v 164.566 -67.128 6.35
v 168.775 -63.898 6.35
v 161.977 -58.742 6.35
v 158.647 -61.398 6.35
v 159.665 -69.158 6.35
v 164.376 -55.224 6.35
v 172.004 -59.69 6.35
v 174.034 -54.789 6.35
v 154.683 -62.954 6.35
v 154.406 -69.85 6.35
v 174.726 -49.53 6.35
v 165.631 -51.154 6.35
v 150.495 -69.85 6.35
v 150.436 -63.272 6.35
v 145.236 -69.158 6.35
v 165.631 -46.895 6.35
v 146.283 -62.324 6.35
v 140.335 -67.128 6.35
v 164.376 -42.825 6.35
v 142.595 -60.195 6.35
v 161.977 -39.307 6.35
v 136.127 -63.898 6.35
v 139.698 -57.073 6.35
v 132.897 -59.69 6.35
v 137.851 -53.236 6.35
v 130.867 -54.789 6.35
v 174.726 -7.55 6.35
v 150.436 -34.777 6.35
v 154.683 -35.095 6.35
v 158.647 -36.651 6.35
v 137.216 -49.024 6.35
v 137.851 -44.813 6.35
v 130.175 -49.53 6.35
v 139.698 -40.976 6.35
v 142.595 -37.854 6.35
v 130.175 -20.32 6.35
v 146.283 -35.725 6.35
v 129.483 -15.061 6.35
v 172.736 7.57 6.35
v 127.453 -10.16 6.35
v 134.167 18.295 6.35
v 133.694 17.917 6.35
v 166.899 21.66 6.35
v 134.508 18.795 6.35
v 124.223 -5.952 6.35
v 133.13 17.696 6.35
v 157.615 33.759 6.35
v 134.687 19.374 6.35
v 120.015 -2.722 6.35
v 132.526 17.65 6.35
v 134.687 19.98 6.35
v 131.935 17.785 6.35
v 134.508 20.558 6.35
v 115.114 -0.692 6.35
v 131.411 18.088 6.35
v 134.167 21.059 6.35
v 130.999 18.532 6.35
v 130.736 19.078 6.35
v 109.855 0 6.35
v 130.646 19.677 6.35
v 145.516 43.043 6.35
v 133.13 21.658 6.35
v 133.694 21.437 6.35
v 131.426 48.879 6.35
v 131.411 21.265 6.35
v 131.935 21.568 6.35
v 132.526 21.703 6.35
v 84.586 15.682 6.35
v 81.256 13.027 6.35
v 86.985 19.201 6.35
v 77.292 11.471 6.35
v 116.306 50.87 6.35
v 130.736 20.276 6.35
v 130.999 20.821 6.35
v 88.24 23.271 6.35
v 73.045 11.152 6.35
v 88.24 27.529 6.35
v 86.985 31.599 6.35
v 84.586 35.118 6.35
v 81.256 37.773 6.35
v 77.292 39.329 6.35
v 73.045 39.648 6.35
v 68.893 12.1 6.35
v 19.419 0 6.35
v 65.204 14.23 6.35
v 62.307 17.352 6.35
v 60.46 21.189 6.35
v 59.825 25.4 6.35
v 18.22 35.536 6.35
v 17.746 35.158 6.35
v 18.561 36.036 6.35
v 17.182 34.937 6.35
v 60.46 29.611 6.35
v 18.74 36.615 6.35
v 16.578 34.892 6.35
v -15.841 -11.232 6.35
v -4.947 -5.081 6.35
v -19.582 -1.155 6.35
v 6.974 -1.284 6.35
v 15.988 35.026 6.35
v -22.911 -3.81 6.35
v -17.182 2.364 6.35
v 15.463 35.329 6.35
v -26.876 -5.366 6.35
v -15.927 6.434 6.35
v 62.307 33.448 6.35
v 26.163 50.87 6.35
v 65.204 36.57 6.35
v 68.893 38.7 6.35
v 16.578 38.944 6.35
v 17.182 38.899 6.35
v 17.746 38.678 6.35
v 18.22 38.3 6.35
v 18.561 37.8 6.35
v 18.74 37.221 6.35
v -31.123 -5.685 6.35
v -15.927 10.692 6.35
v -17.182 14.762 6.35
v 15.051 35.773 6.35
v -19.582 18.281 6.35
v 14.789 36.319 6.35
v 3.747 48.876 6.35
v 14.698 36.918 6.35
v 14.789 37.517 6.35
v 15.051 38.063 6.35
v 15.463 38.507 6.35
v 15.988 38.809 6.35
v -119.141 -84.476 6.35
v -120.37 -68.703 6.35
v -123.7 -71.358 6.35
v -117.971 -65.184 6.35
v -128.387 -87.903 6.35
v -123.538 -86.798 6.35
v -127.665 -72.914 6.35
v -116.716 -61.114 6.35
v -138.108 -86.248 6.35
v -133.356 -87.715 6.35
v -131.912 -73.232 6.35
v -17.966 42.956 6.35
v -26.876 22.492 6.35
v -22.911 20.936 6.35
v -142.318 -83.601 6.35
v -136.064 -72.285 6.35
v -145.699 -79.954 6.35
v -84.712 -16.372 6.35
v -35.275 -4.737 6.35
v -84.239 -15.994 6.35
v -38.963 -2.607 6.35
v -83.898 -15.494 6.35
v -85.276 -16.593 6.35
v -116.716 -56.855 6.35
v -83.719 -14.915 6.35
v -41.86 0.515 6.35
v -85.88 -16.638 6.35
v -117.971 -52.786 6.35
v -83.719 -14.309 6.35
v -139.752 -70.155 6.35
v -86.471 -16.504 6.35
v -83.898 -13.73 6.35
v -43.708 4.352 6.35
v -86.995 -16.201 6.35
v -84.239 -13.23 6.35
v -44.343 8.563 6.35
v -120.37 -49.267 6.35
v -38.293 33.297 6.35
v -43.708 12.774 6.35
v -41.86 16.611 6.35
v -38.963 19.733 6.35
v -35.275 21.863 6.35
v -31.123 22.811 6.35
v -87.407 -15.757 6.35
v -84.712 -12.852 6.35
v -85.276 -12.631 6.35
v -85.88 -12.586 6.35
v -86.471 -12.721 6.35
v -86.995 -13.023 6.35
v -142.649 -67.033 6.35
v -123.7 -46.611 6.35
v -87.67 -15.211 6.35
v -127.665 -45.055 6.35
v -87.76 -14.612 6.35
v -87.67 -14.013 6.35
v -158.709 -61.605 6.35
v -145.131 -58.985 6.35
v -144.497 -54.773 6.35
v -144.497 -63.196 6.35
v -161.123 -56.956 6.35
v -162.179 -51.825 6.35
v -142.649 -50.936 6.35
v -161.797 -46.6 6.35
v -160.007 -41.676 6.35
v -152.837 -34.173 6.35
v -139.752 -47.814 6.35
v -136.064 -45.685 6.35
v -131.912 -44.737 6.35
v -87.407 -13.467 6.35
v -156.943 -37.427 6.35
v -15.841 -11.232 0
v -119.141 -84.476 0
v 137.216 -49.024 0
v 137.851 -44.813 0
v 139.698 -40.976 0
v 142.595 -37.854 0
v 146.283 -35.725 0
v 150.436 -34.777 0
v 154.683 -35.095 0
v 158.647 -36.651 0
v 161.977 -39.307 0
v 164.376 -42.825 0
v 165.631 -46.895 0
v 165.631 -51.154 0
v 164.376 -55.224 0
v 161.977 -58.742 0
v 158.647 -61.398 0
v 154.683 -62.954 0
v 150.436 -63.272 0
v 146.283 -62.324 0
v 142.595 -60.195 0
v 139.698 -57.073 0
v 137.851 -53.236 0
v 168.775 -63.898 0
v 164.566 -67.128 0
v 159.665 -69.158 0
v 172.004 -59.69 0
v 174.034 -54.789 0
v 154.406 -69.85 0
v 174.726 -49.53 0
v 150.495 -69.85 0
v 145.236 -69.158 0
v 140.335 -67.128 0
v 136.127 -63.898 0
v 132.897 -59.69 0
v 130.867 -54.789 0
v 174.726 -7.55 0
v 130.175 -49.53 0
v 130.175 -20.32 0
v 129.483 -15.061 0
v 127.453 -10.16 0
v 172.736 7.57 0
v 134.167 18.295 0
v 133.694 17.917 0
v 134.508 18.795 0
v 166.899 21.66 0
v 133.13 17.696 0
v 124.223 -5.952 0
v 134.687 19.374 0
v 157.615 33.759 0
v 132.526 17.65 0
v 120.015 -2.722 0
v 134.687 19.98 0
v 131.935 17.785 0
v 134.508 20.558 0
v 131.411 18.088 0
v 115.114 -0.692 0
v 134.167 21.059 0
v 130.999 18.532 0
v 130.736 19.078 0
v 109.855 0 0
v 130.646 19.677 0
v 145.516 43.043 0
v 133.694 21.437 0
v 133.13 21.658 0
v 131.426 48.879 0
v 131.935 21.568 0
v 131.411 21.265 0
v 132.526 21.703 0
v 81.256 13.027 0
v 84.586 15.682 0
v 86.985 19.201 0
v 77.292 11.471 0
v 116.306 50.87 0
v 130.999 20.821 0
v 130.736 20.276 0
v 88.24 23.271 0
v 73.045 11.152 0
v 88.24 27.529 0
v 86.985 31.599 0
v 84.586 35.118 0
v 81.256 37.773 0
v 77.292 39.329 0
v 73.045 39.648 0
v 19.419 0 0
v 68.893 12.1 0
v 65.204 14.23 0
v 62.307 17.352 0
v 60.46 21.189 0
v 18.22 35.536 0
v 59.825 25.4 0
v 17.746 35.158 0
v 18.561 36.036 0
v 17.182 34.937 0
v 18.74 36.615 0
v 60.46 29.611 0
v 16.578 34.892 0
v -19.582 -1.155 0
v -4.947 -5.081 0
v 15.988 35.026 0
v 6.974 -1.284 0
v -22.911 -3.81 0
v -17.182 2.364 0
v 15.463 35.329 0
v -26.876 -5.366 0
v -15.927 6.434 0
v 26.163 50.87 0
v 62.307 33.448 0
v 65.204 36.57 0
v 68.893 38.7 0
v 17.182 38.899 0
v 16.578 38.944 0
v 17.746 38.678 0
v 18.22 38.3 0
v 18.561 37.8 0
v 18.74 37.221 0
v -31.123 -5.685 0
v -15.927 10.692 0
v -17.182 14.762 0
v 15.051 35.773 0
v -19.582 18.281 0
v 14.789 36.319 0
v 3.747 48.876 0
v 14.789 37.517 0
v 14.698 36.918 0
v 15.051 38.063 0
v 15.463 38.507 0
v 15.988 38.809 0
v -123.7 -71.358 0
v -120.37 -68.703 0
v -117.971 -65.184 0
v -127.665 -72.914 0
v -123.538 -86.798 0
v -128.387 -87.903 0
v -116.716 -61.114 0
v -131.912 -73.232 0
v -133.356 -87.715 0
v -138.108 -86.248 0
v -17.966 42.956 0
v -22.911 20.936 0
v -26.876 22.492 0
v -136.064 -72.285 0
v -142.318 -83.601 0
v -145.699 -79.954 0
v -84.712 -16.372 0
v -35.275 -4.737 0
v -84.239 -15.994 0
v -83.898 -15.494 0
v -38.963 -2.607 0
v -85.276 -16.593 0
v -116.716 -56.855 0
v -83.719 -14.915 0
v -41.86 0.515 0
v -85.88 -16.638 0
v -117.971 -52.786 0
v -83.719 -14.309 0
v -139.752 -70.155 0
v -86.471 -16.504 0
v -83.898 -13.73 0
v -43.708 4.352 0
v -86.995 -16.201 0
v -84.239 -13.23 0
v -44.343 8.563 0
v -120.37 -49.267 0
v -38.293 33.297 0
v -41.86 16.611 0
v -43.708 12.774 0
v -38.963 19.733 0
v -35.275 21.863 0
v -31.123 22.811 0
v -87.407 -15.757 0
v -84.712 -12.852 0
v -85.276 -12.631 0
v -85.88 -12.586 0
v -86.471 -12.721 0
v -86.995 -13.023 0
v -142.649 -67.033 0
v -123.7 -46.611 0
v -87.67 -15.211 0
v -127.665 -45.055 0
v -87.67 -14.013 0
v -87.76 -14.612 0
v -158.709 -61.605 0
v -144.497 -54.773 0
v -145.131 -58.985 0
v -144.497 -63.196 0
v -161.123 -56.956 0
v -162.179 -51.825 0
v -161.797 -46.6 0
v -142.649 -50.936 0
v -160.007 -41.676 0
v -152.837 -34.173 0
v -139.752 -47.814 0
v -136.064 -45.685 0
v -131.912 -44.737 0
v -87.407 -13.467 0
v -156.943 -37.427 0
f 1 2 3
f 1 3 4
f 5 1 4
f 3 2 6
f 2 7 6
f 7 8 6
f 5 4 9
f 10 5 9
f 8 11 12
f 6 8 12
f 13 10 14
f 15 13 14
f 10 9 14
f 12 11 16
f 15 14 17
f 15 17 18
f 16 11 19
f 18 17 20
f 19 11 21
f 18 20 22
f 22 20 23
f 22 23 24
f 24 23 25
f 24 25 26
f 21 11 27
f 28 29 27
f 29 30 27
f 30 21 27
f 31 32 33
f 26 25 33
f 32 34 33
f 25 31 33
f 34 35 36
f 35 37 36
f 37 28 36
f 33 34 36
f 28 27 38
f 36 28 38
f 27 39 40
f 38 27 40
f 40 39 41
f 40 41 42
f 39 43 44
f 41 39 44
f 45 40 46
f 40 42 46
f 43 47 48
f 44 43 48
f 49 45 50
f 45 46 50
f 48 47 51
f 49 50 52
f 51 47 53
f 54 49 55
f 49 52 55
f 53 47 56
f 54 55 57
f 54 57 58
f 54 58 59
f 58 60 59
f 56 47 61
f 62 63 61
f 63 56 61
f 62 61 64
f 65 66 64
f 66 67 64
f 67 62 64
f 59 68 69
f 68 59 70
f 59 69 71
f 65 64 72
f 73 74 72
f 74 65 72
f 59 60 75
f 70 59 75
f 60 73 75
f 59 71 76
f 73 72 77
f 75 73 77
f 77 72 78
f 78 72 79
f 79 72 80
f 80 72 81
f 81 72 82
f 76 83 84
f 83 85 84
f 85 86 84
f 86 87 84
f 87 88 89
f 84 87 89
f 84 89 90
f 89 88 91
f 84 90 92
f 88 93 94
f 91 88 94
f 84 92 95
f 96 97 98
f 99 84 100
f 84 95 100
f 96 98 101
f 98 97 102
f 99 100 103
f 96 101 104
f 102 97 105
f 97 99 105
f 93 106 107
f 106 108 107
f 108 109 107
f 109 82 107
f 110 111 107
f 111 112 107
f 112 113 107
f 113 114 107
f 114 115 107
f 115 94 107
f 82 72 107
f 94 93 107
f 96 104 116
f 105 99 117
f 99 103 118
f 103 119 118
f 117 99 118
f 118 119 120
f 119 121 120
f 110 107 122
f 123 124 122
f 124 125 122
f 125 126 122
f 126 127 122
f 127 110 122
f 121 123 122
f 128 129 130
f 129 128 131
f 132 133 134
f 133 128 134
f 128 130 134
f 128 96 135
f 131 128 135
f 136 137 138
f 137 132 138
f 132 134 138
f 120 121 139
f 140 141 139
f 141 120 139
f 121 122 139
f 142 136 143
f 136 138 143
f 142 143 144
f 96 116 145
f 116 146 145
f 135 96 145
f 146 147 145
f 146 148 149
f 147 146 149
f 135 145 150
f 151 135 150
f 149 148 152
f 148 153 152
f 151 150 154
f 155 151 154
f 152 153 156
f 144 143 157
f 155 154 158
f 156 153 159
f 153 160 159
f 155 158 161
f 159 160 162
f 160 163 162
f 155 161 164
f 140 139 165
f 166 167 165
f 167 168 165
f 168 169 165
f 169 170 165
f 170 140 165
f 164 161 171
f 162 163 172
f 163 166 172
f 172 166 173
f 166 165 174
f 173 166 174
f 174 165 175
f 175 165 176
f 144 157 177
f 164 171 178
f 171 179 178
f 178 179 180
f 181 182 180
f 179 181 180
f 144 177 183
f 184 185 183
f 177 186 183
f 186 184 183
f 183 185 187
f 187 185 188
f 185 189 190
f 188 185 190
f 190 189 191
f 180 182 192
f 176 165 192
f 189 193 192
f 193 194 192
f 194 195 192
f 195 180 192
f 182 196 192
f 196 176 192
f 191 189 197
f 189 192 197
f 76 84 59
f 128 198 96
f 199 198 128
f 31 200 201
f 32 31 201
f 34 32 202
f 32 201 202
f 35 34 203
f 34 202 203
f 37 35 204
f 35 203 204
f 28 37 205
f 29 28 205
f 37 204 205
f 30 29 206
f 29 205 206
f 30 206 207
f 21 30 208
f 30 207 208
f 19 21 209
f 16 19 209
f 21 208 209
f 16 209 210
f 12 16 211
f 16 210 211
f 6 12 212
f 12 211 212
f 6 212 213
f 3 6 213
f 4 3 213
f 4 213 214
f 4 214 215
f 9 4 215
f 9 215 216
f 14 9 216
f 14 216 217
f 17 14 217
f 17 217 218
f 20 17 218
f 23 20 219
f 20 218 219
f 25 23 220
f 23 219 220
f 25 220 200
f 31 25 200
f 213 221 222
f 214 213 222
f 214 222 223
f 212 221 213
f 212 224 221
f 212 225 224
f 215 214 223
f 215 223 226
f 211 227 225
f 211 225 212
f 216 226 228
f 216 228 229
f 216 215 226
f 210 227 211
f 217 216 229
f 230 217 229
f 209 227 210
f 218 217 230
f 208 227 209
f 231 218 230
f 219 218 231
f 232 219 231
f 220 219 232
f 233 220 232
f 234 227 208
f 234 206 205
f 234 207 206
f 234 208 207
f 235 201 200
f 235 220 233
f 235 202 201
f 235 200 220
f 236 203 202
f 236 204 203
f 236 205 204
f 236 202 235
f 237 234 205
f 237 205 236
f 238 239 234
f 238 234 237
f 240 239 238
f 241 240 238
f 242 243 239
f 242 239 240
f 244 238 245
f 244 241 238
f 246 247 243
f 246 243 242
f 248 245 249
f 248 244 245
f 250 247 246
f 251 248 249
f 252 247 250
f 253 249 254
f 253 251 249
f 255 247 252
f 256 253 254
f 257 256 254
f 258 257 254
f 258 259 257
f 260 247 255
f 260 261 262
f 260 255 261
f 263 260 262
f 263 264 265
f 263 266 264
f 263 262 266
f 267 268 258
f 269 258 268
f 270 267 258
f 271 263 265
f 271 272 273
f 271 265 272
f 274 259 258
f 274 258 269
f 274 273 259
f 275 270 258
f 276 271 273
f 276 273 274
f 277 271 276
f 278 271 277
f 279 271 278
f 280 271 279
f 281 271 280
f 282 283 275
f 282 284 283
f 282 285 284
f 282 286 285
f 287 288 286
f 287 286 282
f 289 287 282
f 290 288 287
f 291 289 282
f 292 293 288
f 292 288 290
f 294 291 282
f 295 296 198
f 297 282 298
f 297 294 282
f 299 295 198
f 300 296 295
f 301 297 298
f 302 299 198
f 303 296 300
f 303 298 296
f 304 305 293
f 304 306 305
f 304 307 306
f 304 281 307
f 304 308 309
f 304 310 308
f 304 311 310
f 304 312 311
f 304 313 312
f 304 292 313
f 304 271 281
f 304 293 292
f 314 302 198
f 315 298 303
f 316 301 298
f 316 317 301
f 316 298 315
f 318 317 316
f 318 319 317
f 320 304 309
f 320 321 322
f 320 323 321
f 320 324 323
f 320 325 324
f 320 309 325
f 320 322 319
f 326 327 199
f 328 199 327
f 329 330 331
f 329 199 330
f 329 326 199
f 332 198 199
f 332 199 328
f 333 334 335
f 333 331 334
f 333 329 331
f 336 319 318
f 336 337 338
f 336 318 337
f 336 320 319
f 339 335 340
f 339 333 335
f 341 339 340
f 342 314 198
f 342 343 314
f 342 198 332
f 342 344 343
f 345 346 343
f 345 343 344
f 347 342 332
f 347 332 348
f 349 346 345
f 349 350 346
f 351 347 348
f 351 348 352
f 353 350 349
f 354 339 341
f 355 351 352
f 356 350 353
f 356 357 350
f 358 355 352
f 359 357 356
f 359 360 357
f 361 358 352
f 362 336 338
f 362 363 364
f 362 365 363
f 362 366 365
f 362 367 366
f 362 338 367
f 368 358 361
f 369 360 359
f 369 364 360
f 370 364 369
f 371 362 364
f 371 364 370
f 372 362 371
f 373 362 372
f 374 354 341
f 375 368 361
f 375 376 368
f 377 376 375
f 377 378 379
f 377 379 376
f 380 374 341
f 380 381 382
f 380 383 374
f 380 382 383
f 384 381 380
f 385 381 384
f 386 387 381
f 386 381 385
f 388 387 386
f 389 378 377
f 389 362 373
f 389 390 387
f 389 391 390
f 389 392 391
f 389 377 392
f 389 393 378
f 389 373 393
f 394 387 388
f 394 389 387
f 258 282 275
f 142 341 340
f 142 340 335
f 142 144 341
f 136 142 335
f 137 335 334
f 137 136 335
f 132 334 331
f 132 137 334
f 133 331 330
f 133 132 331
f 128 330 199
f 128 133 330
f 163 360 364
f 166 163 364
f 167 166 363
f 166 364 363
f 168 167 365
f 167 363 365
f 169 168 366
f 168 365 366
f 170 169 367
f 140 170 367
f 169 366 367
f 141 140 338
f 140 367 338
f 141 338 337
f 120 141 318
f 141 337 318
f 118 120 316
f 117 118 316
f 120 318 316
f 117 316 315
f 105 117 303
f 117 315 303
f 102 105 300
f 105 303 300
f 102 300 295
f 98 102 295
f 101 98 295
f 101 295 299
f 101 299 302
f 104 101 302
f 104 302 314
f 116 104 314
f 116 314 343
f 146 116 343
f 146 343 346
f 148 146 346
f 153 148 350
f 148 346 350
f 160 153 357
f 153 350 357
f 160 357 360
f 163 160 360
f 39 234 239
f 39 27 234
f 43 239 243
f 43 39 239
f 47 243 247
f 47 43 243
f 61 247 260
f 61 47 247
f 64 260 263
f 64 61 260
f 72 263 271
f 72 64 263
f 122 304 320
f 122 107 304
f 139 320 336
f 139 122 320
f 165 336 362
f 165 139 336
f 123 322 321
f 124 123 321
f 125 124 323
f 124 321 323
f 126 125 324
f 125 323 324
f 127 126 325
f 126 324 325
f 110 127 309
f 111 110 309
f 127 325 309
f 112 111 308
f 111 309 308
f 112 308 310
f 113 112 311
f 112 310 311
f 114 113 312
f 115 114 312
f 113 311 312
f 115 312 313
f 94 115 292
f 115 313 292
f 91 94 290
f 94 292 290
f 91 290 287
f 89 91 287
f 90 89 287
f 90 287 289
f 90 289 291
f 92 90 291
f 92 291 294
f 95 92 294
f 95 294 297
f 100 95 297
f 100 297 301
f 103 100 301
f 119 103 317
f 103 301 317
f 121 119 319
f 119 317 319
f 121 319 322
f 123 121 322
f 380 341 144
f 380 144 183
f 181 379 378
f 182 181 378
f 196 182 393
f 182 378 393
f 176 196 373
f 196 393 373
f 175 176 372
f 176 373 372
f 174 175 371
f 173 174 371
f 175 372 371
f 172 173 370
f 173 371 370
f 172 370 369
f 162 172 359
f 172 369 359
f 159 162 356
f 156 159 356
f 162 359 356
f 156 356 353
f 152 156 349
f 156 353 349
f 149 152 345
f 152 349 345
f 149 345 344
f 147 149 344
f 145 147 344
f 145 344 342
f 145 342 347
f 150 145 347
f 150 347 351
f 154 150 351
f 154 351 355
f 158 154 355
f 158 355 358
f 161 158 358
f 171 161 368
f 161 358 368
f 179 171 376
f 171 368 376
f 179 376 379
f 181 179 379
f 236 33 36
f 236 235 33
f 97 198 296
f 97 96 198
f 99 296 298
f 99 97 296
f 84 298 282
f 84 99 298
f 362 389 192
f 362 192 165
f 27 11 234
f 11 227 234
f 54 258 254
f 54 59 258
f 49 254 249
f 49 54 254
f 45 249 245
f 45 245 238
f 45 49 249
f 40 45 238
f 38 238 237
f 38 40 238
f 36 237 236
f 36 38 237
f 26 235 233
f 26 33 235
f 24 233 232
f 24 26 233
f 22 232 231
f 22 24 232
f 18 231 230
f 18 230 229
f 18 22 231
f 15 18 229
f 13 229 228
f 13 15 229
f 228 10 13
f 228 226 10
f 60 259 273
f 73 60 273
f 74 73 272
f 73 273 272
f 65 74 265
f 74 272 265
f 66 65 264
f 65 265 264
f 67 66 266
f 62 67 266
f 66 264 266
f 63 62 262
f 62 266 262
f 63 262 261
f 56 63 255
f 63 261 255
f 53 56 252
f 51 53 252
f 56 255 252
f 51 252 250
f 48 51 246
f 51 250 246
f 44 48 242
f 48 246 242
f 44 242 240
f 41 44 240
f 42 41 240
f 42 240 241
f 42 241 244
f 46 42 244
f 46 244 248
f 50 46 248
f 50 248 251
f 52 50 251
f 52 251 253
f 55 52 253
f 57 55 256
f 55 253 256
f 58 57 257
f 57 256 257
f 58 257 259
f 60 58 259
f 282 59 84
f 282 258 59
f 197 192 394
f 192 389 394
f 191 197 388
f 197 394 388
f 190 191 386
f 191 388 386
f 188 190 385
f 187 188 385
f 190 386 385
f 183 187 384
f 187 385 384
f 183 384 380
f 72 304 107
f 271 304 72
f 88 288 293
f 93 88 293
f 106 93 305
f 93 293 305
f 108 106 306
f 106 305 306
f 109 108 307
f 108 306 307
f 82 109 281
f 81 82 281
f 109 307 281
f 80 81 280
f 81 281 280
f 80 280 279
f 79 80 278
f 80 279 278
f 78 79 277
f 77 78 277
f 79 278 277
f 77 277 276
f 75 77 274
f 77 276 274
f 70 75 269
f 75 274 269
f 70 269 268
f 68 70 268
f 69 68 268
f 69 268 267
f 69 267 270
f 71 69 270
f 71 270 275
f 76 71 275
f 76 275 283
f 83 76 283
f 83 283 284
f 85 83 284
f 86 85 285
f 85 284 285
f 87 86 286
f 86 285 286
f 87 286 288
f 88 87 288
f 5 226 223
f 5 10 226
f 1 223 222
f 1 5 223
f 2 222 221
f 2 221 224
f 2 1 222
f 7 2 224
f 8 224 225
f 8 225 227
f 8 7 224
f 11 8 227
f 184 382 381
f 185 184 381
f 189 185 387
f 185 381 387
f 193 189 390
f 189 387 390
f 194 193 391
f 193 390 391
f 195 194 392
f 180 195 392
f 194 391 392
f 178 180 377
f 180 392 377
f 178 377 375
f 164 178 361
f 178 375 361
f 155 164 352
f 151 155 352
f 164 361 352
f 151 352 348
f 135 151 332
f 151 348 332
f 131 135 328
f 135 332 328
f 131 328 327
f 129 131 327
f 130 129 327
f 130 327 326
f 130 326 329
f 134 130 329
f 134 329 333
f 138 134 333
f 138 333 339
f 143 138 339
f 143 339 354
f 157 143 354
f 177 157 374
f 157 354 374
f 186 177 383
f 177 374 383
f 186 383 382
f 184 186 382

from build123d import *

# Parameters (mm, degrees)
BOSS_EXTRUDE1_DEPTH = 3.175
FILLET4_R           = 127
FILLET8_R           = 6.35
SKETCH4_R           = 14.2875
SKETCH4_R_2         = 2.032
CUT_EXTRUDE1_DEPTH  = 18.415
FILLET20_R          = 33.02
BOSS_EXTRUDE3_DEPTH = 6.35
FILLET23_R          = 127
FILLET24_R          = 19.05
FILLET25_R          = 19.05
SKETCH4_2_R         = 14.2875
SKETCH4_2_R_2       = 2.032
CUT_EXTRUDE2_DEPTH  = 6.35
FILLET27_R          = 60.96
FILLET28_R          = 20.32
FILLET29_R          = 20.32
FILLET30_R          = 20.32
FILLET31_R          = 58.42


with BuildPart() as part:
    # Sketch1 → Boss-Extrude1 (new body)
    with BuildSketch(Plane.XY):
        Polygon((0, 0), (-134.680588616, -95.49423569), (-170.699937974, -44.69423569), (-8.460282393, 50.869520386), (174.726114012, 50.869520386), (174.726114012, -31.75), (174.726114012, -69.85), (130.175, -69.85), (130.175, 0), align=None)
    extrude(amount=BOSS_EXTRUDE1_DEPTH)

    # Fillet4
    fillet4_edges = [part.edges().sort_by_distance(p)[0] for p in [
        (-8.460282393, 50.869520386, 1.5875),
    ]]
    fillet(fillet4_edges, radius=FILLET4_R)

    # Fillet8
    fillet8_edges = [part.edges().sort_by_distance(p)[0] for p in [
        (174.726114012, 50.869520386, 1.5875),
    ]]
    fillet(fillet8_edges, radius=FILLET8_R)

    # Sketch4 → Cut-Extrude1 (cut)
    with BuildSketch(Plane(origin=(0, 0, 0), x_dir=(-1, 0, 0), z_dir=(0, 0, -1))):
        with Locations((-151.503295524, -49.024477041)):
            Circle(SKETCH4_R)
        with Locations((130.843837195, -58.984690885)):
            Circle(SKETCH4_R)
        with Locations((30.055030467, 8.563007376)):
            Circle(SKETCH4_R)
        with Locations((-74.112358802, 25.4)):
            Circle(SKETCH4_R)
        with Locations((85.728358398, -14.612108422)):
            Circle(SKETCH4_R_2)
        with Locations((-132.677584994, 19.676786483)):
            Circle(SKETCH4_R_2)
        with Locations((-16.730295544, 36.917955745)):
            Circle(SKETCH4_R_2)
    extrude(amount=-CUT_EXTRUDE1_DEPTH, mode=Mode.SUBTRACT)

    # Fillet20
    fillet20_edges = [part.edges().sort_by_distance(p)[0] for p in [
        (-134.680588616, -95.49423569, 1.5875),
    ]]
    fillet(fillet20_edges, radius=FILLET20_R)

    # Sketch1<3> → Boss-Extrude3 (add)
    with BuildSketch(Plane.XY):
        Polygon((0, 0), (-134.680588616, -95.49423569), (-170.699937974, -44.69423569), (-8.460282393, 50.869520386), (174.726114012, 50.869520386), (174.726114012, -31.75), (174.726114012, -69.85), (130.175, -69.85), (130.175, 0), align=None)
    extrude(amount=BOSS_EXTRUDE3_DEPTH)

    # Fillet23
    fillet23_edges = [part.edges().sort_by_distance(p)[0] for p in [
        (-8.460282393, 50.869520386, 3.175),
    ]]
    fillet(fillet23_edges, radius=FILLET23_R)

    # Fillet24
    fillet24_edges = [part.edges().sort_by_distance(p)[0] for p in [
        (-170.699937974, -44.69423569, 3.175),
    ]]
    fillet(fillet24_edges, radius=FILLET24_R)

    # Fillet25
    fillet25_edges = [part.edges().sort_by_distance(p)[0] for p in [
        (-134.680588616, -95.49423569, 3.175),
    ]]
    fillet(fillet25_edges, radius=FILLET25_R)

    # Sketch4<2> → Cut-Extrude2 (cut)
    with BuildSketch(Plane(origin=(0, 0, 0), x_dir=(-1, 0, 0), z_dir=(0, 0, -1))):
        with Locations((-151.503295524, -49.024477041)):
            Circle(SKETCH4_2_R)
        with Locations((130.843837195, -58.984690885)):
            Circle(SKETCH4_2_R)
        with Locations((30.055030467, 8.563007376)):
            Circle(SKETCH4_2_R)
        with Locations((-74.112358802, 25.4)):
            Circle(SKETCH4_2_R)
        with Locations((85.728358398, -14.612108422)):
            Circle(SKETCH4_2_R_2)
        with Locations((-132.677584994, 19.676786483)):
            Circle(SKETCH4_2_R_2)
        with Locations((-16.730295544, 36.917955745)):
            Circle(SKETCH4_2_R_2)
    extrude(amount=-CUT_EXTRUDE2_DEPTH, mode=Mode.SUBTRACT)

    # Fillet27
    fillet27_edges = [part.edges().sort_by_distance(p)[0] for p in [
        (0, 0, 3.175),
    ]]
    fillet(fillet27_edges, radius=FILLET27_R)

    # Fillet28
    fillet28_edges = [part.edges().sort_by_distance(p)[0] for p in [
        (130.175, 0, 3.175),
    ]]
    fillet(fillet28_edges, radius=FILLET28_R)

    # Fillet29
    fillet29_edges = [part.edges().sort_by_distance(p)[0] for p in [
        (130.175, -69.85, 3.175),
    ]]
    fillet(fillet29_edges, radius=FILLET29_R)

    # Fillet30
    fillet30_edges = [part.edges().sort_by_distance(p)[0] for p in [
        (174.726114012, -69.85, 3.175),
    ]]
    fillet(fillet30_edges, radius=FILLET30_R)

    # Fillet31
    fillet31_edges = [part.edges().sort_by_distance(p)[0] for p in [
        (174.726114012, 50.869520386, 3.175),
    ]]
    fillet(fillet31_edges, radius=FILLET31_R)


solid = part.part
